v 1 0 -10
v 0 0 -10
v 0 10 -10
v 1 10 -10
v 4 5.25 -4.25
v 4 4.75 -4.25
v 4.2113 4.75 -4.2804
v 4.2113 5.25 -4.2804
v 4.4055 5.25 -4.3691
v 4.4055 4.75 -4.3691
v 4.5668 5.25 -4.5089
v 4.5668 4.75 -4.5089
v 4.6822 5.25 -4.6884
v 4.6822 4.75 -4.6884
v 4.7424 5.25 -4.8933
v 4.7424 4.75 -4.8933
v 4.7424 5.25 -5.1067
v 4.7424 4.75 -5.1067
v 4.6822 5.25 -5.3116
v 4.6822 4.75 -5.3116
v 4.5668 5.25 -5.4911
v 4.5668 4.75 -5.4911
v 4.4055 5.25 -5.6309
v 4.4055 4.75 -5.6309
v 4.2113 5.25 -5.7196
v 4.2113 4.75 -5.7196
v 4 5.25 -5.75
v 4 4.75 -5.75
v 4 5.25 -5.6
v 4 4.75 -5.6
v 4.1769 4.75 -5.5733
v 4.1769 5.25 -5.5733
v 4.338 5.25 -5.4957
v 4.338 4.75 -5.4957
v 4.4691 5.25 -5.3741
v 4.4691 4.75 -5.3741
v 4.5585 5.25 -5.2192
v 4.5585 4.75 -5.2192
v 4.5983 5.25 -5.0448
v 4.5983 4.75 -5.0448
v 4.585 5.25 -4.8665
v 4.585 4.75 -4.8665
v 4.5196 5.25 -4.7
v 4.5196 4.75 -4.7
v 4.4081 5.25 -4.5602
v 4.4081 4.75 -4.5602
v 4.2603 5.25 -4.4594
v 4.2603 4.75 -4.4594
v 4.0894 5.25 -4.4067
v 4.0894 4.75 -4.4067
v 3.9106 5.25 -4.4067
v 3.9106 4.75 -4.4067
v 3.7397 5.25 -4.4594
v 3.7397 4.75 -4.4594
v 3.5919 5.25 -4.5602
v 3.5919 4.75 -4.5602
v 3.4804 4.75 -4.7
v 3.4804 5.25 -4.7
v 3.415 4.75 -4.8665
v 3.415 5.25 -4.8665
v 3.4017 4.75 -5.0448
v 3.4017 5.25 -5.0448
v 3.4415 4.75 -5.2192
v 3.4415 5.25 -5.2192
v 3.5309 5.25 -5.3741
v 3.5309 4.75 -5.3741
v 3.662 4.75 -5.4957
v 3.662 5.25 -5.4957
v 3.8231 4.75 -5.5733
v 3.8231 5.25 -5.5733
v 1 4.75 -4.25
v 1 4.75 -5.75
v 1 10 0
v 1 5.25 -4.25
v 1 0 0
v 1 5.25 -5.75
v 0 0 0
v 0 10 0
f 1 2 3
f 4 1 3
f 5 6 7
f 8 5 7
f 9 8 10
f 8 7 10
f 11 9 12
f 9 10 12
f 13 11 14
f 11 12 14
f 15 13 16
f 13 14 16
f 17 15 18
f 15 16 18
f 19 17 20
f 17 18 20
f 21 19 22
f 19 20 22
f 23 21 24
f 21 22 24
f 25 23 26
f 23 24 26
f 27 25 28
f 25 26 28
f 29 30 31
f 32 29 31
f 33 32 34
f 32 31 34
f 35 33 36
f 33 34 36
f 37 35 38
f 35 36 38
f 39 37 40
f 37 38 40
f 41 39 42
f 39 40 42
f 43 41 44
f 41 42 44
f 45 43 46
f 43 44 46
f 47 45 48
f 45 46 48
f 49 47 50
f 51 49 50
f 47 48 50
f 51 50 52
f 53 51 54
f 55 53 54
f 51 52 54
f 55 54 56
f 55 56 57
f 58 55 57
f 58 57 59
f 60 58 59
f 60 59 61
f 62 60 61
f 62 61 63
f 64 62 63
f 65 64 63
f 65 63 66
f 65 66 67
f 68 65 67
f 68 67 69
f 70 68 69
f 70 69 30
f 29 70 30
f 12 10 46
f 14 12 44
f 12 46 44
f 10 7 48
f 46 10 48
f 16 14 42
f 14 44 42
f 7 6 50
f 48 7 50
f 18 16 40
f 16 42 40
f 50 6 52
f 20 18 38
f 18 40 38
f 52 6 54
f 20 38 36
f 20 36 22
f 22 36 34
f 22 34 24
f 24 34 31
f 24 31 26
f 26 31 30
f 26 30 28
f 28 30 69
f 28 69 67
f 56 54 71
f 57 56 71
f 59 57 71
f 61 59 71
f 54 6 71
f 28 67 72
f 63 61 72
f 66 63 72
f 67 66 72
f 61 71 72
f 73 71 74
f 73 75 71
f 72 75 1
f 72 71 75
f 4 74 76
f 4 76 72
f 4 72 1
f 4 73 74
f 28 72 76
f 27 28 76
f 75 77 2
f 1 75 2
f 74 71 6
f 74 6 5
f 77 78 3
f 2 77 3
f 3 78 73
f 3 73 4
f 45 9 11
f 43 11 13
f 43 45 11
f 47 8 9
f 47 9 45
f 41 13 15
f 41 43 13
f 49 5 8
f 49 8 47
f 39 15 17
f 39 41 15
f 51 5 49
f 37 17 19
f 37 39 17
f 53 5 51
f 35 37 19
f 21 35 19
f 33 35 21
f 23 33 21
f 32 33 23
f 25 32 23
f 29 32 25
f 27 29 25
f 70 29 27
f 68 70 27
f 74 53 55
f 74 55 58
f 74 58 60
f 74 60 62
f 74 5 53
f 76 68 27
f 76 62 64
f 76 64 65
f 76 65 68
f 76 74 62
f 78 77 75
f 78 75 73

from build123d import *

# Parameters (mm, degrees)
SKETCH_1_W          = 10
SKETCH_1_H          = 10
EXTRUDE_1_DEPTH     = 1
SKETCH_2_W          = 1.5
SKETCH_2_H          = 0.5
EXTRUDE_2_DEPTH     = 8
CUT_EXTRUDE_2_DEPTH = 2
SKETCH_4_R          = 0.6
CUT_EXTRUDE_3_DEPTH = 2


with BuildPart() as part:
    # 草图1 → 凸台-拉伸1 (new body)
    with BuildSketch(Plane(origin=(0, 0, 0), x_dir=(0, 0, -1), z_dir=(1, 0, 0))):
        with Locations((5, 5)):
            Rectangle(SKETCH_1_W, SKETCH_1_H)
    extrude(amount=EXTRUDE_1_DEPTH)

    # 草图2 → 凸台-拉伸2 (add)
    with BuildSketch(Plane(origin=(1, 0, 0), x_dir=(0, 0, -1), z_dir=(1, 0, 0))):
        with Locations((5, 5)):
            Rectangle(SKETCH_2_W, SKETCH_2_H)
    extrude(amount=EXTRUDE_2_DEPTH)

    # 草图3 → 切除-拉伸2 (cut)
    with BuildSketch(Plane.XZ.offset(-4.75)):
        with BuildLine():
            Line((9, -4.25), (4, -4.25))
            ThreePointArc((4, -4.25), (4.75, -5), (4, -5.75))
            Line((4, -5.75), (9, -5.75))
            Line((9, -5.75), (9, -4.25))
        make_face()
    extrude(amount=-CUT_EXTRUDE_2_DEPTH, mode=Mode.SUBTRACT)

    # 草图4 → 切除-拉伸3 (cut)
    with BuildSketch(Plane.XZ.offset(-4.75)):
        with Locations(Location((4, -5, 0), (0, 0, 270))):
            Circle(SKETCH_4_R)
    extrude(amount=-CUT_EXTRUDE_3_DEPTH, mode=Mode.SUBTRACT)


solid = part.part
